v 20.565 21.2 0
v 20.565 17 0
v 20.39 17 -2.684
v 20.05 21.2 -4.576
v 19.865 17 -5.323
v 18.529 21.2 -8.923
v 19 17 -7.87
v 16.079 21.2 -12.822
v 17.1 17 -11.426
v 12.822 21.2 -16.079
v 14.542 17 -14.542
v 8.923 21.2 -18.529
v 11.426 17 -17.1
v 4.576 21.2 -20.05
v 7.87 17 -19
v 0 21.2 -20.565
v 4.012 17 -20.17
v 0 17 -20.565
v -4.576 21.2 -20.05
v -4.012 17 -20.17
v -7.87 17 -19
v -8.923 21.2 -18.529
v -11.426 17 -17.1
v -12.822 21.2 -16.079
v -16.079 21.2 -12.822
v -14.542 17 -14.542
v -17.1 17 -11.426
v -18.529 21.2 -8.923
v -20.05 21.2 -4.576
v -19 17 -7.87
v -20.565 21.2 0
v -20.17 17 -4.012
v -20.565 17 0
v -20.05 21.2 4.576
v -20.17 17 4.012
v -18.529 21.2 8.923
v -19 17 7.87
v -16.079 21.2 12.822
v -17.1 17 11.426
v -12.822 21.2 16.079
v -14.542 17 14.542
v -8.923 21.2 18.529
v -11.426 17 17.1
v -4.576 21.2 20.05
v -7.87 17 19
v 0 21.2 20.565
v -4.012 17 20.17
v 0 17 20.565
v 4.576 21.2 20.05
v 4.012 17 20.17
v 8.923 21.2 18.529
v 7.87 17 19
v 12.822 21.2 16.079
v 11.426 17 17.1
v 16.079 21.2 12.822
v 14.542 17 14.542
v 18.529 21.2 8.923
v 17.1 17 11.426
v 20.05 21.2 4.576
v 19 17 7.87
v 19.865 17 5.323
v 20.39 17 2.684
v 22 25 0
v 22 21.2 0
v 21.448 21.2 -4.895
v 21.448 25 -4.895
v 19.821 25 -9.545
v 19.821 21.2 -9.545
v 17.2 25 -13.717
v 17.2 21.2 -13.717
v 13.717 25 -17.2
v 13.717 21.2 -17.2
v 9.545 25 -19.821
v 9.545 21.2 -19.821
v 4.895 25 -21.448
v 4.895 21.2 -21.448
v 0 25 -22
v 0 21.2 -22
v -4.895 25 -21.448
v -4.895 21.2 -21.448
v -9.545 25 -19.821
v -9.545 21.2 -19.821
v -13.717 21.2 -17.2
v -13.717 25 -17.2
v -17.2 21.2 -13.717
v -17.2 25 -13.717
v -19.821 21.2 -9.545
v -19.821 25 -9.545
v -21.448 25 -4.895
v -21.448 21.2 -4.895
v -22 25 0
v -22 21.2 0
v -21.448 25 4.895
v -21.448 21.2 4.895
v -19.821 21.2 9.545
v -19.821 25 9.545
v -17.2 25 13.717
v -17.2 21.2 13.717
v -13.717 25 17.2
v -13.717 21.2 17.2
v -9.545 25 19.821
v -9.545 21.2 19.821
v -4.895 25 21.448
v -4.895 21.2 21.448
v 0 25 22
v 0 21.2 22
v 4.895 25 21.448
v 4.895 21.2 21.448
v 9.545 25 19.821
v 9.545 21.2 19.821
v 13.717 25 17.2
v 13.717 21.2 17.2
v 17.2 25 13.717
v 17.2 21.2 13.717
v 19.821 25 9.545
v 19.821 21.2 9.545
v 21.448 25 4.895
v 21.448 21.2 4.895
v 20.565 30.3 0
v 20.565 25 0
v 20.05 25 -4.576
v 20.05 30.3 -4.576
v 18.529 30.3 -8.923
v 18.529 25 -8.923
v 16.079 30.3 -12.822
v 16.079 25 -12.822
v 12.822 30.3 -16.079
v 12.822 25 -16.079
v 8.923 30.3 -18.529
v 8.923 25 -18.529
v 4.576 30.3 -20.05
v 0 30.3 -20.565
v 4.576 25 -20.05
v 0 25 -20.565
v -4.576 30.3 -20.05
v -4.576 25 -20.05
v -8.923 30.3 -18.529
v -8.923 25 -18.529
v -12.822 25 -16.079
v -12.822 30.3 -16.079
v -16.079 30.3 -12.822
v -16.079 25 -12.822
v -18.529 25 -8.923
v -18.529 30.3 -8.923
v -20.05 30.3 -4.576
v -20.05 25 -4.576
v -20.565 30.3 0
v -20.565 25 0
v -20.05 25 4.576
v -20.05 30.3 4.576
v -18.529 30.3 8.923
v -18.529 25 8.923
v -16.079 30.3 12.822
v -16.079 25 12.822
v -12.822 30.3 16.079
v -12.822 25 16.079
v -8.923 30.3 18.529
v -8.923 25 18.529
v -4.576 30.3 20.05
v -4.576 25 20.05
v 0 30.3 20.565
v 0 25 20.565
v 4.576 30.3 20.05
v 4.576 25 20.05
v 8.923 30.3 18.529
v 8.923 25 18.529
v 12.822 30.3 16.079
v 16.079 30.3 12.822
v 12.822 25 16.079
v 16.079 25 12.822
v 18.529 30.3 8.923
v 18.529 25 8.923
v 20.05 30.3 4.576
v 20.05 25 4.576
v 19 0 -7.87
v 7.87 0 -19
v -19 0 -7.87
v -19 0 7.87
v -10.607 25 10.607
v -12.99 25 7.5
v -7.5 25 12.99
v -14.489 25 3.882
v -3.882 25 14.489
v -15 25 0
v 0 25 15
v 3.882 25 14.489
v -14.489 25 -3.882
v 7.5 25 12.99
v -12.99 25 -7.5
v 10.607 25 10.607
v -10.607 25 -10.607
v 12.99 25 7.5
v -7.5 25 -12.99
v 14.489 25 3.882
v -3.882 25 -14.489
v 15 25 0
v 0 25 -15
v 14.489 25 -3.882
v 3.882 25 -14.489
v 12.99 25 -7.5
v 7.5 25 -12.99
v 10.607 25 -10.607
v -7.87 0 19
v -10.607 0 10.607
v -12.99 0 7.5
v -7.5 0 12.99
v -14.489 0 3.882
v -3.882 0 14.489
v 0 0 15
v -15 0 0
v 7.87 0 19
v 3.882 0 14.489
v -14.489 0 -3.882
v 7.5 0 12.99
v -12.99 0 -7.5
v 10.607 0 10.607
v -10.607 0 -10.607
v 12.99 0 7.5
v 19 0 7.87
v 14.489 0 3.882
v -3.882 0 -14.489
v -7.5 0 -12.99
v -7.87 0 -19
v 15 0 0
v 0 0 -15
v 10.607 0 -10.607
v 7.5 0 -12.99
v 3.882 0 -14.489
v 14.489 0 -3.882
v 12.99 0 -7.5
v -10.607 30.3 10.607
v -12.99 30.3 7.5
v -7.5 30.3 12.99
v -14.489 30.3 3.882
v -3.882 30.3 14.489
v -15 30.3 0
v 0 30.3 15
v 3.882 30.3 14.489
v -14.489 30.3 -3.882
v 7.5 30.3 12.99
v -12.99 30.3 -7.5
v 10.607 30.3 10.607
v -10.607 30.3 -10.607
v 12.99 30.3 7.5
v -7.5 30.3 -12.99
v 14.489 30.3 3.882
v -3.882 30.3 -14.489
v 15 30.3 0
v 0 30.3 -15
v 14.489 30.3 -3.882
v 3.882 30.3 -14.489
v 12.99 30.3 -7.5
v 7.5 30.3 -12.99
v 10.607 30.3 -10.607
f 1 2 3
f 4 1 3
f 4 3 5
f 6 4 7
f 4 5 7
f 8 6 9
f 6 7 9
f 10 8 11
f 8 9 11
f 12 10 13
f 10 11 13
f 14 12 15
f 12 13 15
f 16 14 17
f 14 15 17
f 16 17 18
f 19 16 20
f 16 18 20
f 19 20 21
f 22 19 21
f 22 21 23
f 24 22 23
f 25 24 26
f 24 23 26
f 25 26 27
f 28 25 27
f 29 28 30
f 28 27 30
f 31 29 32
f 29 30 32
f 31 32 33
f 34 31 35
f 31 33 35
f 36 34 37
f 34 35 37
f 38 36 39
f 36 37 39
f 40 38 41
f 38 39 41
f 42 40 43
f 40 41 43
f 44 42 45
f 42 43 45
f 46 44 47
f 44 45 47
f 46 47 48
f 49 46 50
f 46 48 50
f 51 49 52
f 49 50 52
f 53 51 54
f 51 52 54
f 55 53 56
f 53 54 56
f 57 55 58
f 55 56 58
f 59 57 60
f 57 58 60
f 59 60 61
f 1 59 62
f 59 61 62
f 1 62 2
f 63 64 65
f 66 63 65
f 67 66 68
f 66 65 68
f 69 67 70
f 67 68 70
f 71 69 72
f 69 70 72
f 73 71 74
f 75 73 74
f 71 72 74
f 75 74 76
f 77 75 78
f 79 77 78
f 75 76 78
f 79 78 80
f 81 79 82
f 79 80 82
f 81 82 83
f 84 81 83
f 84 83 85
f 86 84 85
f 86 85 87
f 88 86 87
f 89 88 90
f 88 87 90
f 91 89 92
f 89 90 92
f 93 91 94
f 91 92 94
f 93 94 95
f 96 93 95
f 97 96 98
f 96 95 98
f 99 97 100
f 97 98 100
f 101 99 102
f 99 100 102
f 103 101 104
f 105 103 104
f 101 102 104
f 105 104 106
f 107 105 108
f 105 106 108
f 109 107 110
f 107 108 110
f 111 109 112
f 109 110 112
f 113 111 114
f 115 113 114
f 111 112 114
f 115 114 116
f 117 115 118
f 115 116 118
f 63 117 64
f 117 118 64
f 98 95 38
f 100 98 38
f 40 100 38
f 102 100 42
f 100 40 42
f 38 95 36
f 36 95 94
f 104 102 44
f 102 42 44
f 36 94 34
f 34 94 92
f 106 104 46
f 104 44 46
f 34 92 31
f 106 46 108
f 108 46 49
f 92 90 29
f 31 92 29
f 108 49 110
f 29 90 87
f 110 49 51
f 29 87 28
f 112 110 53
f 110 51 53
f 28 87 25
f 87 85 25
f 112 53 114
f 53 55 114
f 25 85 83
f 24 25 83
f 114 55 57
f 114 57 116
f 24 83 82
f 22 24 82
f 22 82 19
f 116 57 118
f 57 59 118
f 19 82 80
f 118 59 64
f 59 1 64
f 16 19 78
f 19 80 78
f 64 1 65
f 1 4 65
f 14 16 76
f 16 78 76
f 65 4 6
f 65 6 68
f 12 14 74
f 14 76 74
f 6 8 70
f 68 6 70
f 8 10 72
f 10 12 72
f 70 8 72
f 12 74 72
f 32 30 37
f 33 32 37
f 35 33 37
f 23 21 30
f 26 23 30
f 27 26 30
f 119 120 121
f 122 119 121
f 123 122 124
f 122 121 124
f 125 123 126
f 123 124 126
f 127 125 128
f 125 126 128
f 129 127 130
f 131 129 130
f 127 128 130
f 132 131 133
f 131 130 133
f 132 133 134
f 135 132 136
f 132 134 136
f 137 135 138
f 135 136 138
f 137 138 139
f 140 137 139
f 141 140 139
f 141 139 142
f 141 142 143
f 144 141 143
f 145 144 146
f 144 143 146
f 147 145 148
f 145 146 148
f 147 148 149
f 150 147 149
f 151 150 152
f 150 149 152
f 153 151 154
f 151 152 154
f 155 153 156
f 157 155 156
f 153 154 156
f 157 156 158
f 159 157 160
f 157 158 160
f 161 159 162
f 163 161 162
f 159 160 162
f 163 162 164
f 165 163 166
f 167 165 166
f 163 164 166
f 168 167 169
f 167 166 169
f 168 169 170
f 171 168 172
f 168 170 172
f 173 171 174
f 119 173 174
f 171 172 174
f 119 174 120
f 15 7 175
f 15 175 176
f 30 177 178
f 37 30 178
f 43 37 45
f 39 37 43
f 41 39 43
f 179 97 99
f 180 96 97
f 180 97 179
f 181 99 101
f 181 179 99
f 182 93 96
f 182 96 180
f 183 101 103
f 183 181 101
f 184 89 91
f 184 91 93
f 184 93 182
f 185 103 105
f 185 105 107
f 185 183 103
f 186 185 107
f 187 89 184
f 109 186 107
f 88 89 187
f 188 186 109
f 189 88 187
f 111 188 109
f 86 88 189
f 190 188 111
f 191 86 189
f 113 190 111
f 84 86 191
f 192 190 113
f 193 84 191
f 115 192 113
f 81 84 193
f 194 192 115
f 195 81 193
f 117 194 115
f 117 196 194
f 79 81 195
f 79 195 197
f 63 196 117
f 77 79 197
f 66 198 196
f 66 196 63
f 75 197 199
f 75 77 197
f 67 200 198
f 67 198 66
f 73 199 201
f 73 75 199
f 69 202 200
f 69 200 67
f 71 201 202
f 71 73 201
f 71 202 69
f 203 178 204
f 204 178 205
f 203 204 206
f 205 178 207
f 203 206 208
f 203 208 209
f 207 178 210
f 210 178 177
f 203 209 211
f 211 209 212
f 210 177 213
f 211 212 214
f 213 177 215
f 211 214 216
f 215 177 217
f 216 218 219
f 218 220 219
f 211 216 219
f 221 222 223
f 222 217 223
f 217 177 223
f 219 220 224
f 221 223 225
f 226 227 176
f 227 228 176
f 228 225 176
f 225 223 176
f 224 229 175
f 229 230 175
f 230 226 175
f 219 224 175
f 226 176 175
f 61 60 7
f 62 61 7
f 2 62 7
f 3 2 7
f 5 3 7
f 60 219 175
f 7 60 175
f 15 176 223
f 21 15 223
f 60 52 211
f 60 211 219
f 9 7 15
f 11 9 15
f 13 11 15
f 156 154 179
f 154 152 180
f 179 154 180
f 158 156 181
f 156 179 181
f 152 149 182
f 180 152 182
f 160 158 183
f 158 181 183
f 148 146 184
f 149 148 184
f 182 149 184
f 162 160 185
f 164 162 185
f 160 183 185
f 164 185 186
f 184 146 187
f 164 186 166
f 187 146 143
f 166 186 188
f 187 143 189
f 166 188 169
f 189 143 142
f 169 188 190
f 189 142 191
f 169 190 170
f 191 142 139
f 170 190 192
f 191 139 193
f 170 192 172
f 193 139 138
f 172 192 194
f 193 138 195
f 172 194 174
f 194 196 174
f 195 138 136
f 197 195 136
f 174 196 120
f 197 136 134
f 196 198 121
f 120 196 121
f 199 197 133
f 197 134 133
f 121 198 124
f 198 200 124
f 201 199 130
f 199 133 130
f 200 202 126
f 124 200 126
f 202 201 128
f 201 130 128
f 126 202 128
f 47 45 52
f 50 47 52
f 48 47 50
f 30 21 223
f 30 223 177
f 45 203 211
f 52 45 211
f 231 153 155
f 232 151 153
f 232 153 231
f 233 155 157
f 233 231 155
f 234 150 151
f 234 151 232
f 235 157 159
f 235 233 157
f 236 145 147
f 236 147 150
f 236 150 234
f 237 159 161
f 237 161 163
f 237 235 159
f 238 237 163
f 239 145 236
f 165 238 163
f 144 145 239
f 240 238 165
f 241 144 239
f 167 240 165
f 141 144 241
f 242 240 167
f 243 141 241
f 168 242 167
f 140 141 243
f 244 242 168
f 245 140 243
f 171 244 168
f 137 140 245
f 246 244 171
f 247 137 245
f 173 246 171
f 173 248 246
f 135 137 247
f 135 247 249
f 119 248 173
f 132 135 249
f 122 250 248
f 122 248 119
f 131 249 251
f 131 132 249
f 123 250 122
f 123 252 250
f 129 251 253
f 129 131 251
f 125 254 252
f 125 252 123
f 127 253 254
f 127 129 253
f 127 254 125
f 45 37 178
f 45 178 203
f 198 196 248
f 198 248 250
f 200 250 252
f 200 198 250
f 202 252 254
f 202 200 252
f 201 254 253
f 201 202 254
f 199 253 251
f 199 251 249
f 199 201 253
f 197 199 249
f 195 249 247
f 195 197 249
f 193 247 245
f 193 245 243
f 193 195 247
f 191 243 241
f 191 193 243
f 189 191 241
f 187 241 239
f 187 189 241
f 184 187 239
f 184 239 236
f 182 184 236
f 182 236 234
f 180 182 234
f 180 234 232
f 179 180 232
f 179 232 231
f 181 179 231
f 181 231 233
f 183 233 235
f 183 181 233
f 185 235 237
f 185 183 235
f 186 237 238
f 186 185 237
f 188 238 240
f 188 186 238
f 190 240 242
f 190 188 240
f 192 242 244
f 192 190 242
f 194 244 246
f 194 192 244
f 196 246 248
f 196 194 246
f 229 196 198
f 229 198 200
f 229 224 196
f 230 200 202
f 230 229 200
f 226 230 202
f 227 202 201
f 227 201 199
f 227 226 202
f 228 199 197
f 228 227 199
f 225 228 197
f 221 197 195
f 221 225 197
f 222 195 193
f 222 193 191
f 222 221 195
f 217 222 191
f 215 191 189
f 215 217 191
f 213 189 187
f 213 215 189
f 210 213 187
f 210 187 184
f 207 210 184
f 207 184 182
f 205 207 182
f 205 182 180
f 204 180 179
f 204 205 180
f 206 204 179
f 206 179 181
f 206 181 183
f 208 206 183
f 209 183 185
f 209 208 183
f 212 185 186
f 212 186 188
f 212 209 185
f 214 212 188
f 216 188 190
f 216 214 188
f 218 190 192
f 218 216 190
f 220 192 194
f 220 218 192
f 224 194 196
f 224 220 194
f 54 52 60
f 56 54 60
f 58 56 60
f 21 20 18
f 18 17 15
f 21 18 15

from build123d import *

# Parameters (mm, degrees)
ESBO_O1_R                = 15
RESSALTO_EXTRUS_O1_DEPTH = 17
ESBO_O2_R                = 20.565451806
ESBO_O2_R_2              = 15
RESSALTO_EXTRUS_O2_DEPTH = 4.2
ESBO_O3_R                = 22
ESBO_O3_R_2              = 15
RESSALTO_EXTRUS_O3_DEPTH = 3.8
ESBO_O4_R                = 20.565451806
ESBO_O4_R_2              = 15
RESSALTO_EXTRUS_O4_DEPTH = 5.3


with BuildPart() as part:
    # Esboço1 → Ressalto-extrusão1 (new body)
    with BuildSketch(Plane(origin=(0, 0, 0), x_dir=(1, 0, 0), z_dir=(0, 1, 0))):
        Polygon((7.870057685, -19), (19, -7.870057685), (19, 7.870057685), (7.870057685, 19), (-7.870057685, 19), (-19, 7.870057685), (-19, -7.870057685), (-7.870057685, -19), align=None)
        Circle(ESBO_O1_R, mode=Mode.SUBTRACT)
    extrude(amount=RESSALTO_EXTRUS_O1_DEPTH)

    # Esboço2 → Ressalto-extrusão2 (add)
    with BuildSketch(Plane(origin=(0, 17, 0), x_dir=(1, 0, 0), z_dir=(0, 1, 0))):
        Circle(ESBO_O2_R)
        Circle(ESBO_O2_R_2, mode=Mode.SUBTRACT)
    extrude(amount=RESSALTO_EXTRUS_O2_DEPTH)

    # Esboço3 → Ressalto-extrusão3 (add)
    with BuildSketch(Plane(origin=(0, 21.2, 0), x_dir=(1, 0, 0), z_dir=(0, 1, 0))):
        Circle(ESBO_O3_R)
        Circle(ESBO_O3_R_2, mode=Mode.SUBTRACT)
    extrude(amount=RESSALTO_EXTRUS_O3_DEPTH)


with BuildPart() as body_2:
    # Esboço4 → Ressalto-extrusão4 (new body)
    with BuildSketch(Plane(origin=(0, 25, 0), x_dir=(1, 0, 0), z_dir=(0, 1, 0))):
        Circle(ESBO_O4_R)
        Circle(ESBO_O4_R_2, mode=Mode.SUBTRACT)
    extrude(amount=RESSALTO_EXTRUS_O4_DEPTH)


solid = Compound([part.part, body_2.part])
